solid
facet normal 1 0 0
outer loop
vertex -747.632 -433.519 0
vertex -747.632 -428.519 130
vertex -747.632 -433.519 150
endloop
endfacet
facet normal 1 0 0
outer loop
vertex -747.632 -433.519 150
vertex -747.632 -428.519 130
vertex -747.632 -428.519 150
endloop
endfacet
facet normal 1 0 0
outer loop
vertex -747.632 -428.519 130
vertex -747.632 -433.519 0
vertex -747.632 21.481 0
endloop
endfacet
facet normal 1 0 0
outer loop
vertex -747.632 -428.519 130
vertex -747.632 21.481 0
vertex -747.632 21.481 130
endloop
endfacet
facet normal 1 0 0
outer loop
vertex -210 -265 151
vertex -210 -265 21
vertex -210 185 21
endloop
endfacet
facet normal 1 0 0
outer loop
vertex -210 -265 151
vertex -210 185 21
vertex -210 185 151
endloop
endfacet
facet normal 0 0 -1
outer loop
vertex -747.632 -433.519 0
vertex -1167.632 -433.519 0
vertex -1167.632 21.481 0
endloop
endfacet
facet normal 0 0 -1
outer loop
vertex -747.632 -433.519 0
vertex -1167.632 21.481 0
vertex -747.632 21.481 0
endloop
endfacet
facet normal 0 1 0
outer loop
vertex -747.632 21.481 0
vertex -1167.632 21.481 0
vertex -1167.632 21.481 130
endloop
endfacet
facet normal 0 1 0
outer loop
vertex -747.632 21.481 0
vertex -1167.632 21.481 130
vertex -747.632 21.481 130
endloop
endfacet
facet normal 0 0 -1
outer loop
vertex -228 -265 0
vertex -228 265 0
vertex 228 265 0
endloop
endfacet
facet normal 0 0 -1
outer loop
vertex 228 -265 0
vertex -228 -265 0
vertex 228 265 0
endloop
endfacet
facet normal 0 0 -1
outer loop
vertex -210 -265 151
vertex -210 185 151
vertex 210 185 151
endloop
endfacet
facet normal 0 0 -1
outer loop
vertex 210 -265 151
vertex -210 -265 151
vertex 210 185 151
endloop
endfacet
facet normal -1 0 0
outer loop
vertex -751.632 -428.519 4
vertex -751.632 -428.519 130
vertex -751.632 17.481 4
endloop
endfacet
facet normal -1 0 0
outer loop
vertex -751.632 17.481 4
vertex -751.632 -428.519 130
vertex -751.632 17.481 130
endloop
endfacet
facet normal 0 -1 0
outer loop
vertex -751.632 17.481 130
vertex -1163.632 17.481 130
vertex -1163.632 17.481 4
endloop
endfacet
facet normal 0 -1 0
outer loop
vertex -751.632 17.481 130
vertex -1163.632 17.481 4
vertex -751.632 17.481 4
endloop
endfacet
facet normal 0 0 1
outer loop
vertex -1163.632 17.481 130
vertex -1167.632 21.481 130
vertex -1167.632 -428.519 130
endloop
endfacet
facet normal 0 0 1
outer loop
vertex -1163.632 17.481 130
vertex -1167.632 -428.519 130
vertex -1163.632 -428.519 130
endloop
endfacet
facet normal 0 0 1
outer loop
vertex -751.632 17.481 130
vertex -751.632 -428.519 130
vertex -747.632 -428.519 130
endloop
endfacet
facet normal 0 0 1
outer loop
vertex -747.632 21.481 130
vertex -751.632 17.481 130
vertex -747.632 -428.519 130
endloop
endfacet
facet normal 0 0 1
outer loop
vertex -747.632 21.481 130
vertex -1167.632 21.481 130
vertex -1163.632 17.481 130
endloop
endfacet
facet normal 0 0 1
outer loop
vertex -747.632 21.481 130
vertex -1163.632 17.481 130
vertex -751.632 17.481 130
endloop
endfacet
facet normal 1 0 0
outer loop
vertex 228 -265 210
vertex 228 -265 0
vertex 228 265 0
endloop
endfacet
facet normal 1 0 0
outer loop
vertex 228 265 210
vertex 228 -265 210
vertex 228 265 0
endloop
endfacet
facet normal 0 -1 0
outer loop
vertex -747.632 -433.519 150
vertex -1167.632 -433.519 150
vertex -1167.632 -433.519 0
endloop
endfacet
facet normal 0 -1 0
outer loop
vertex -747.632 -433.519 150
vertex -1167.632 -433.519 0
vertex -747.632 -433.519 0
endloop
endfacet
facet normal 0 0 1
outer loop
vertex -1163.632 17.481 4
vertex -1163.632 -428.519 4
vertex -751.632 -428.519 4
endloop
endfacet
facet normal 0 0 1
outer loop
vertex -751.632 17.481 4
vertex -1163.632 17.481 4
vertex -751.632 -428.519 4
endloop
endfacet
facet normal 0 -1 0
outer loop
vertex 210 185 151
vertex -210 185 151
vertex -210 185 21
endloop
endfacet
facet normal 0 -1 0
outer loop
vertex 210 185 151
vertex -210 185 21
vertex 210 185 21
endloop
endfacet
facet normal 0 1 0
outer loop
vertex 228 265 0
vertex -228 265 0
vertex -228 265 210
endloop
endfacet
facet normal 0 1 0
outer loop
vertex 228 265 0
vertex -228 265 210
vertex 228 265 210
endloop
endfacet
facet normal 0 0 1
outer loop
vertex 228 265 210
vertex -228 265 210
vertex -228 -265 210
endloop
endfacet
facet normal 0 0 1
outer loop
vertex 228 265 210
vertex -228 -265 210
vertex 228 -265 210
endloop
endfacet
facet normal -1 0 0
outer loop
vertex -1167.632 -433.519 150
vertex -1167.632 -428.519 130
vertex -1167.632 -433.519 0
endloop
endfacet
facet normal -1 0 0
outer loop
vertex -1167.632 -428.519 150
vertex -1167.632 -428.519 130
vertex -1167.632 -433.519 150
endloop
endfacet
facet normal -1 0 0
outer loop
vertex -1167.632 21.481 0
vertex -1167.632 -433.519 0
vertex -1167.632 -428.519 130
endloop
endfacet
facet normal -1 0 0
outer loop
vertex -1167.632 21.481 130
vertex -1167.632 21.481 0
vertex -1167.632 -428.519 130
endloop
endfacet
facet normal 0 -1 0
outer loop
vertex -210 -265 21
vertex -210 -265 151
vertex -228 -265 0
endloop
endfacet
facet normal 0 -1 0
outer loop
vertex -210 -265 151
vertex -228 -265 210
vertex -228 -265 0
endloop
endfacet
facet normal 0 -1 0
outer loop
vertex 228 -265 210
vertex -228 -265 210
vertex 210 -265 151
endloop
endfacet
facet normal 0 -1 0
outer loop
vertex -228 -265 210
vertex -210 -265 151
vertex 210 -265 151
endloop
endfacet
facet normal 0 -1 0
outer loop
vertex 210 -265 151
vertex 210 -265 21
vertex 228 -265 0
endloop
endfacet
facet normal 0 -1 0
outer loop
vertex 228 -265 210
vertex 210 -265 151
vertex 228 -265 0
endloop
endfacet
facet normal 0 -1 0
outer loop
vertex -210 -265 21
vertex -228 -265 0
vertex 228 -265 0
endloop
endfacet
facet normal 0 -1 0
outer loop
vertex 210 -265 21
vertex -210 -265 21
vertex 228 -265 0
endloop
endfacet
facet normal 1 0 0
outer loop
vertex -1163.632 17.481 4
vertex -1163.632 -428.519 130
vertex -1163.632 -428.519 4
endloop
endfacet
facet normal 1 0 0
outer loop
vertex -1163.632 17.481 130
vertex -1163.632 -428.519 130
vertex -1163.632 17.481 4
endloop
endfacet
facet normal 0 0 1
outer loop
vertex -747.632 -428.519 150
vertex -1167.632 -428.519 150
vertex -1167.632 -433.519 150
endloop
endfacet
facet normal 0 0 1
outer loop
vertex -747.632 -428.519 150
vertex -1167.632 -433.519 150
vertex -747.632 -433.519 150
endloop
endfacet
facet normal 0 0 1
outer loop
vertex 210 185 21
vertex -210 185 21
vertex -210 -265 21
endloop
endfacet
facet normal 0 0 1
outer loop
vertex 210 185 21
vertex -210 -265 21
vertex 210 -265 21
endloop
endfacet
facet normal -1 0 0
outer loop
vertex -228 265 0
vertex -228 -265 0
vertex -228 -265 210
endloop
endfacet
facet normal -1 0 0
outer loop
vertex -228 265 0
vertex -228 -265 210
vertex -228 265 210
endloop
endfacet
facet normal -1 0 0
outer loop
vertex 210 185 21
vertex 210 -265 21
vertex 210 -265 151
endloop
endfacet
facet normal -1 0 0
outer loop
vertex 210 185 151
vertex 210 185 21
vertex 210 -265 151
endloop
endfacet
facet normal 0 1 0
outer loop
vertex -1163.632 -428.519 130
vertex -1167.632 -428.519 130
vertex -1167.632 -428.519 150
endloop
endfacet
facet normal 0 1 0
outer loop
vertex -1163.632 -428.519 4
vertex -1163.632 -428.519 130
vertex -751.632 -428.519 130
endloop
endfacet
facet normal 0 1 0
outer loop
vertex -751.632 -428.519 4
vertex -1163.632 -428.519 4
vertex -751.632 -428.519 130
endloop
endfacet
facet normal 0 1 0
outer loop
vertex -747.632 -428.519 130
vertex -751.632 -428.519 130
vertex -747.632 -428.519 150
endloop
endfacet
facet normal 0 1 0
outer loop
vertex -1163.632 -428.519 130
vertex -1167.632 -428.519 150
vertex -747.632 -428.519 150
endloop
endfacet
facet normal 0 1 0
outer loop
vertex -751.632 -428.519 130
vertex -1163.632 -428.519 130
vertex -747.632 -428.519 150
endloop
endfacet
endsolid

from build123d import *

# Parameters (mm, degrees)
F0_W     = 456
F0_H     = 530
F1_DEPTH = 210
F2_W     = 420
F2_H     = 130
F3_DEPTH = 450
F4_W     = 420
F4_H     = 450
F5_DEPTH = 130
F6_W     = 412
F6_H     = 446
F7_DEPTH = 126
F8_W     = 420
F8_H     = 150
F9_DEPTH = 5


with BuildPart() as f1:
    # F0 (on Top) → F1 (new body)
    with BuildSketch(Plane.XY):
        Rectangle(F0_W, F0_H)
    extrude(amount=F1_DEPTH)

    # F2 (on face) → F3 (cut)
    with BuildSketch(Plane.XZ.offset(265)):
        with Locations((0, 86)):
            Rectangle(F2_W, F2_H)
    extrude(amount=-F3_DEPTH, mode=Mode.SUBTRACT)


with BuildPart() as f5:
    # F4 (on Top) → F5 (new body)
    with BuildSketch(Plane.XY):
        with Locations((-957.631946, -203.518585)):
            Rectangle(F4_W, F4_H)
    extrude(amount=F5_DEPTH)

    # F6 (on face) → F7 (cut)
    with BuildSketch(Plane.XY.offset(130)):
        with Locations((-957.631946, -205.518585)):
            Rectangle(F6_W, F6_H)
    extrude(amount=-F7_DEPTH, mode=Mode.SUBTRACT)

    # F8 (on face) → F9 (join)
    with BuildSketch(Plane.XZ.offset(428.518585)):
        with Locations((-957.631946, 75)):
            Rectangle(F8_W, F8_H)
    extrude(amount=F9_DEPTH)


solid = Compound([f1.part, f5.part])
